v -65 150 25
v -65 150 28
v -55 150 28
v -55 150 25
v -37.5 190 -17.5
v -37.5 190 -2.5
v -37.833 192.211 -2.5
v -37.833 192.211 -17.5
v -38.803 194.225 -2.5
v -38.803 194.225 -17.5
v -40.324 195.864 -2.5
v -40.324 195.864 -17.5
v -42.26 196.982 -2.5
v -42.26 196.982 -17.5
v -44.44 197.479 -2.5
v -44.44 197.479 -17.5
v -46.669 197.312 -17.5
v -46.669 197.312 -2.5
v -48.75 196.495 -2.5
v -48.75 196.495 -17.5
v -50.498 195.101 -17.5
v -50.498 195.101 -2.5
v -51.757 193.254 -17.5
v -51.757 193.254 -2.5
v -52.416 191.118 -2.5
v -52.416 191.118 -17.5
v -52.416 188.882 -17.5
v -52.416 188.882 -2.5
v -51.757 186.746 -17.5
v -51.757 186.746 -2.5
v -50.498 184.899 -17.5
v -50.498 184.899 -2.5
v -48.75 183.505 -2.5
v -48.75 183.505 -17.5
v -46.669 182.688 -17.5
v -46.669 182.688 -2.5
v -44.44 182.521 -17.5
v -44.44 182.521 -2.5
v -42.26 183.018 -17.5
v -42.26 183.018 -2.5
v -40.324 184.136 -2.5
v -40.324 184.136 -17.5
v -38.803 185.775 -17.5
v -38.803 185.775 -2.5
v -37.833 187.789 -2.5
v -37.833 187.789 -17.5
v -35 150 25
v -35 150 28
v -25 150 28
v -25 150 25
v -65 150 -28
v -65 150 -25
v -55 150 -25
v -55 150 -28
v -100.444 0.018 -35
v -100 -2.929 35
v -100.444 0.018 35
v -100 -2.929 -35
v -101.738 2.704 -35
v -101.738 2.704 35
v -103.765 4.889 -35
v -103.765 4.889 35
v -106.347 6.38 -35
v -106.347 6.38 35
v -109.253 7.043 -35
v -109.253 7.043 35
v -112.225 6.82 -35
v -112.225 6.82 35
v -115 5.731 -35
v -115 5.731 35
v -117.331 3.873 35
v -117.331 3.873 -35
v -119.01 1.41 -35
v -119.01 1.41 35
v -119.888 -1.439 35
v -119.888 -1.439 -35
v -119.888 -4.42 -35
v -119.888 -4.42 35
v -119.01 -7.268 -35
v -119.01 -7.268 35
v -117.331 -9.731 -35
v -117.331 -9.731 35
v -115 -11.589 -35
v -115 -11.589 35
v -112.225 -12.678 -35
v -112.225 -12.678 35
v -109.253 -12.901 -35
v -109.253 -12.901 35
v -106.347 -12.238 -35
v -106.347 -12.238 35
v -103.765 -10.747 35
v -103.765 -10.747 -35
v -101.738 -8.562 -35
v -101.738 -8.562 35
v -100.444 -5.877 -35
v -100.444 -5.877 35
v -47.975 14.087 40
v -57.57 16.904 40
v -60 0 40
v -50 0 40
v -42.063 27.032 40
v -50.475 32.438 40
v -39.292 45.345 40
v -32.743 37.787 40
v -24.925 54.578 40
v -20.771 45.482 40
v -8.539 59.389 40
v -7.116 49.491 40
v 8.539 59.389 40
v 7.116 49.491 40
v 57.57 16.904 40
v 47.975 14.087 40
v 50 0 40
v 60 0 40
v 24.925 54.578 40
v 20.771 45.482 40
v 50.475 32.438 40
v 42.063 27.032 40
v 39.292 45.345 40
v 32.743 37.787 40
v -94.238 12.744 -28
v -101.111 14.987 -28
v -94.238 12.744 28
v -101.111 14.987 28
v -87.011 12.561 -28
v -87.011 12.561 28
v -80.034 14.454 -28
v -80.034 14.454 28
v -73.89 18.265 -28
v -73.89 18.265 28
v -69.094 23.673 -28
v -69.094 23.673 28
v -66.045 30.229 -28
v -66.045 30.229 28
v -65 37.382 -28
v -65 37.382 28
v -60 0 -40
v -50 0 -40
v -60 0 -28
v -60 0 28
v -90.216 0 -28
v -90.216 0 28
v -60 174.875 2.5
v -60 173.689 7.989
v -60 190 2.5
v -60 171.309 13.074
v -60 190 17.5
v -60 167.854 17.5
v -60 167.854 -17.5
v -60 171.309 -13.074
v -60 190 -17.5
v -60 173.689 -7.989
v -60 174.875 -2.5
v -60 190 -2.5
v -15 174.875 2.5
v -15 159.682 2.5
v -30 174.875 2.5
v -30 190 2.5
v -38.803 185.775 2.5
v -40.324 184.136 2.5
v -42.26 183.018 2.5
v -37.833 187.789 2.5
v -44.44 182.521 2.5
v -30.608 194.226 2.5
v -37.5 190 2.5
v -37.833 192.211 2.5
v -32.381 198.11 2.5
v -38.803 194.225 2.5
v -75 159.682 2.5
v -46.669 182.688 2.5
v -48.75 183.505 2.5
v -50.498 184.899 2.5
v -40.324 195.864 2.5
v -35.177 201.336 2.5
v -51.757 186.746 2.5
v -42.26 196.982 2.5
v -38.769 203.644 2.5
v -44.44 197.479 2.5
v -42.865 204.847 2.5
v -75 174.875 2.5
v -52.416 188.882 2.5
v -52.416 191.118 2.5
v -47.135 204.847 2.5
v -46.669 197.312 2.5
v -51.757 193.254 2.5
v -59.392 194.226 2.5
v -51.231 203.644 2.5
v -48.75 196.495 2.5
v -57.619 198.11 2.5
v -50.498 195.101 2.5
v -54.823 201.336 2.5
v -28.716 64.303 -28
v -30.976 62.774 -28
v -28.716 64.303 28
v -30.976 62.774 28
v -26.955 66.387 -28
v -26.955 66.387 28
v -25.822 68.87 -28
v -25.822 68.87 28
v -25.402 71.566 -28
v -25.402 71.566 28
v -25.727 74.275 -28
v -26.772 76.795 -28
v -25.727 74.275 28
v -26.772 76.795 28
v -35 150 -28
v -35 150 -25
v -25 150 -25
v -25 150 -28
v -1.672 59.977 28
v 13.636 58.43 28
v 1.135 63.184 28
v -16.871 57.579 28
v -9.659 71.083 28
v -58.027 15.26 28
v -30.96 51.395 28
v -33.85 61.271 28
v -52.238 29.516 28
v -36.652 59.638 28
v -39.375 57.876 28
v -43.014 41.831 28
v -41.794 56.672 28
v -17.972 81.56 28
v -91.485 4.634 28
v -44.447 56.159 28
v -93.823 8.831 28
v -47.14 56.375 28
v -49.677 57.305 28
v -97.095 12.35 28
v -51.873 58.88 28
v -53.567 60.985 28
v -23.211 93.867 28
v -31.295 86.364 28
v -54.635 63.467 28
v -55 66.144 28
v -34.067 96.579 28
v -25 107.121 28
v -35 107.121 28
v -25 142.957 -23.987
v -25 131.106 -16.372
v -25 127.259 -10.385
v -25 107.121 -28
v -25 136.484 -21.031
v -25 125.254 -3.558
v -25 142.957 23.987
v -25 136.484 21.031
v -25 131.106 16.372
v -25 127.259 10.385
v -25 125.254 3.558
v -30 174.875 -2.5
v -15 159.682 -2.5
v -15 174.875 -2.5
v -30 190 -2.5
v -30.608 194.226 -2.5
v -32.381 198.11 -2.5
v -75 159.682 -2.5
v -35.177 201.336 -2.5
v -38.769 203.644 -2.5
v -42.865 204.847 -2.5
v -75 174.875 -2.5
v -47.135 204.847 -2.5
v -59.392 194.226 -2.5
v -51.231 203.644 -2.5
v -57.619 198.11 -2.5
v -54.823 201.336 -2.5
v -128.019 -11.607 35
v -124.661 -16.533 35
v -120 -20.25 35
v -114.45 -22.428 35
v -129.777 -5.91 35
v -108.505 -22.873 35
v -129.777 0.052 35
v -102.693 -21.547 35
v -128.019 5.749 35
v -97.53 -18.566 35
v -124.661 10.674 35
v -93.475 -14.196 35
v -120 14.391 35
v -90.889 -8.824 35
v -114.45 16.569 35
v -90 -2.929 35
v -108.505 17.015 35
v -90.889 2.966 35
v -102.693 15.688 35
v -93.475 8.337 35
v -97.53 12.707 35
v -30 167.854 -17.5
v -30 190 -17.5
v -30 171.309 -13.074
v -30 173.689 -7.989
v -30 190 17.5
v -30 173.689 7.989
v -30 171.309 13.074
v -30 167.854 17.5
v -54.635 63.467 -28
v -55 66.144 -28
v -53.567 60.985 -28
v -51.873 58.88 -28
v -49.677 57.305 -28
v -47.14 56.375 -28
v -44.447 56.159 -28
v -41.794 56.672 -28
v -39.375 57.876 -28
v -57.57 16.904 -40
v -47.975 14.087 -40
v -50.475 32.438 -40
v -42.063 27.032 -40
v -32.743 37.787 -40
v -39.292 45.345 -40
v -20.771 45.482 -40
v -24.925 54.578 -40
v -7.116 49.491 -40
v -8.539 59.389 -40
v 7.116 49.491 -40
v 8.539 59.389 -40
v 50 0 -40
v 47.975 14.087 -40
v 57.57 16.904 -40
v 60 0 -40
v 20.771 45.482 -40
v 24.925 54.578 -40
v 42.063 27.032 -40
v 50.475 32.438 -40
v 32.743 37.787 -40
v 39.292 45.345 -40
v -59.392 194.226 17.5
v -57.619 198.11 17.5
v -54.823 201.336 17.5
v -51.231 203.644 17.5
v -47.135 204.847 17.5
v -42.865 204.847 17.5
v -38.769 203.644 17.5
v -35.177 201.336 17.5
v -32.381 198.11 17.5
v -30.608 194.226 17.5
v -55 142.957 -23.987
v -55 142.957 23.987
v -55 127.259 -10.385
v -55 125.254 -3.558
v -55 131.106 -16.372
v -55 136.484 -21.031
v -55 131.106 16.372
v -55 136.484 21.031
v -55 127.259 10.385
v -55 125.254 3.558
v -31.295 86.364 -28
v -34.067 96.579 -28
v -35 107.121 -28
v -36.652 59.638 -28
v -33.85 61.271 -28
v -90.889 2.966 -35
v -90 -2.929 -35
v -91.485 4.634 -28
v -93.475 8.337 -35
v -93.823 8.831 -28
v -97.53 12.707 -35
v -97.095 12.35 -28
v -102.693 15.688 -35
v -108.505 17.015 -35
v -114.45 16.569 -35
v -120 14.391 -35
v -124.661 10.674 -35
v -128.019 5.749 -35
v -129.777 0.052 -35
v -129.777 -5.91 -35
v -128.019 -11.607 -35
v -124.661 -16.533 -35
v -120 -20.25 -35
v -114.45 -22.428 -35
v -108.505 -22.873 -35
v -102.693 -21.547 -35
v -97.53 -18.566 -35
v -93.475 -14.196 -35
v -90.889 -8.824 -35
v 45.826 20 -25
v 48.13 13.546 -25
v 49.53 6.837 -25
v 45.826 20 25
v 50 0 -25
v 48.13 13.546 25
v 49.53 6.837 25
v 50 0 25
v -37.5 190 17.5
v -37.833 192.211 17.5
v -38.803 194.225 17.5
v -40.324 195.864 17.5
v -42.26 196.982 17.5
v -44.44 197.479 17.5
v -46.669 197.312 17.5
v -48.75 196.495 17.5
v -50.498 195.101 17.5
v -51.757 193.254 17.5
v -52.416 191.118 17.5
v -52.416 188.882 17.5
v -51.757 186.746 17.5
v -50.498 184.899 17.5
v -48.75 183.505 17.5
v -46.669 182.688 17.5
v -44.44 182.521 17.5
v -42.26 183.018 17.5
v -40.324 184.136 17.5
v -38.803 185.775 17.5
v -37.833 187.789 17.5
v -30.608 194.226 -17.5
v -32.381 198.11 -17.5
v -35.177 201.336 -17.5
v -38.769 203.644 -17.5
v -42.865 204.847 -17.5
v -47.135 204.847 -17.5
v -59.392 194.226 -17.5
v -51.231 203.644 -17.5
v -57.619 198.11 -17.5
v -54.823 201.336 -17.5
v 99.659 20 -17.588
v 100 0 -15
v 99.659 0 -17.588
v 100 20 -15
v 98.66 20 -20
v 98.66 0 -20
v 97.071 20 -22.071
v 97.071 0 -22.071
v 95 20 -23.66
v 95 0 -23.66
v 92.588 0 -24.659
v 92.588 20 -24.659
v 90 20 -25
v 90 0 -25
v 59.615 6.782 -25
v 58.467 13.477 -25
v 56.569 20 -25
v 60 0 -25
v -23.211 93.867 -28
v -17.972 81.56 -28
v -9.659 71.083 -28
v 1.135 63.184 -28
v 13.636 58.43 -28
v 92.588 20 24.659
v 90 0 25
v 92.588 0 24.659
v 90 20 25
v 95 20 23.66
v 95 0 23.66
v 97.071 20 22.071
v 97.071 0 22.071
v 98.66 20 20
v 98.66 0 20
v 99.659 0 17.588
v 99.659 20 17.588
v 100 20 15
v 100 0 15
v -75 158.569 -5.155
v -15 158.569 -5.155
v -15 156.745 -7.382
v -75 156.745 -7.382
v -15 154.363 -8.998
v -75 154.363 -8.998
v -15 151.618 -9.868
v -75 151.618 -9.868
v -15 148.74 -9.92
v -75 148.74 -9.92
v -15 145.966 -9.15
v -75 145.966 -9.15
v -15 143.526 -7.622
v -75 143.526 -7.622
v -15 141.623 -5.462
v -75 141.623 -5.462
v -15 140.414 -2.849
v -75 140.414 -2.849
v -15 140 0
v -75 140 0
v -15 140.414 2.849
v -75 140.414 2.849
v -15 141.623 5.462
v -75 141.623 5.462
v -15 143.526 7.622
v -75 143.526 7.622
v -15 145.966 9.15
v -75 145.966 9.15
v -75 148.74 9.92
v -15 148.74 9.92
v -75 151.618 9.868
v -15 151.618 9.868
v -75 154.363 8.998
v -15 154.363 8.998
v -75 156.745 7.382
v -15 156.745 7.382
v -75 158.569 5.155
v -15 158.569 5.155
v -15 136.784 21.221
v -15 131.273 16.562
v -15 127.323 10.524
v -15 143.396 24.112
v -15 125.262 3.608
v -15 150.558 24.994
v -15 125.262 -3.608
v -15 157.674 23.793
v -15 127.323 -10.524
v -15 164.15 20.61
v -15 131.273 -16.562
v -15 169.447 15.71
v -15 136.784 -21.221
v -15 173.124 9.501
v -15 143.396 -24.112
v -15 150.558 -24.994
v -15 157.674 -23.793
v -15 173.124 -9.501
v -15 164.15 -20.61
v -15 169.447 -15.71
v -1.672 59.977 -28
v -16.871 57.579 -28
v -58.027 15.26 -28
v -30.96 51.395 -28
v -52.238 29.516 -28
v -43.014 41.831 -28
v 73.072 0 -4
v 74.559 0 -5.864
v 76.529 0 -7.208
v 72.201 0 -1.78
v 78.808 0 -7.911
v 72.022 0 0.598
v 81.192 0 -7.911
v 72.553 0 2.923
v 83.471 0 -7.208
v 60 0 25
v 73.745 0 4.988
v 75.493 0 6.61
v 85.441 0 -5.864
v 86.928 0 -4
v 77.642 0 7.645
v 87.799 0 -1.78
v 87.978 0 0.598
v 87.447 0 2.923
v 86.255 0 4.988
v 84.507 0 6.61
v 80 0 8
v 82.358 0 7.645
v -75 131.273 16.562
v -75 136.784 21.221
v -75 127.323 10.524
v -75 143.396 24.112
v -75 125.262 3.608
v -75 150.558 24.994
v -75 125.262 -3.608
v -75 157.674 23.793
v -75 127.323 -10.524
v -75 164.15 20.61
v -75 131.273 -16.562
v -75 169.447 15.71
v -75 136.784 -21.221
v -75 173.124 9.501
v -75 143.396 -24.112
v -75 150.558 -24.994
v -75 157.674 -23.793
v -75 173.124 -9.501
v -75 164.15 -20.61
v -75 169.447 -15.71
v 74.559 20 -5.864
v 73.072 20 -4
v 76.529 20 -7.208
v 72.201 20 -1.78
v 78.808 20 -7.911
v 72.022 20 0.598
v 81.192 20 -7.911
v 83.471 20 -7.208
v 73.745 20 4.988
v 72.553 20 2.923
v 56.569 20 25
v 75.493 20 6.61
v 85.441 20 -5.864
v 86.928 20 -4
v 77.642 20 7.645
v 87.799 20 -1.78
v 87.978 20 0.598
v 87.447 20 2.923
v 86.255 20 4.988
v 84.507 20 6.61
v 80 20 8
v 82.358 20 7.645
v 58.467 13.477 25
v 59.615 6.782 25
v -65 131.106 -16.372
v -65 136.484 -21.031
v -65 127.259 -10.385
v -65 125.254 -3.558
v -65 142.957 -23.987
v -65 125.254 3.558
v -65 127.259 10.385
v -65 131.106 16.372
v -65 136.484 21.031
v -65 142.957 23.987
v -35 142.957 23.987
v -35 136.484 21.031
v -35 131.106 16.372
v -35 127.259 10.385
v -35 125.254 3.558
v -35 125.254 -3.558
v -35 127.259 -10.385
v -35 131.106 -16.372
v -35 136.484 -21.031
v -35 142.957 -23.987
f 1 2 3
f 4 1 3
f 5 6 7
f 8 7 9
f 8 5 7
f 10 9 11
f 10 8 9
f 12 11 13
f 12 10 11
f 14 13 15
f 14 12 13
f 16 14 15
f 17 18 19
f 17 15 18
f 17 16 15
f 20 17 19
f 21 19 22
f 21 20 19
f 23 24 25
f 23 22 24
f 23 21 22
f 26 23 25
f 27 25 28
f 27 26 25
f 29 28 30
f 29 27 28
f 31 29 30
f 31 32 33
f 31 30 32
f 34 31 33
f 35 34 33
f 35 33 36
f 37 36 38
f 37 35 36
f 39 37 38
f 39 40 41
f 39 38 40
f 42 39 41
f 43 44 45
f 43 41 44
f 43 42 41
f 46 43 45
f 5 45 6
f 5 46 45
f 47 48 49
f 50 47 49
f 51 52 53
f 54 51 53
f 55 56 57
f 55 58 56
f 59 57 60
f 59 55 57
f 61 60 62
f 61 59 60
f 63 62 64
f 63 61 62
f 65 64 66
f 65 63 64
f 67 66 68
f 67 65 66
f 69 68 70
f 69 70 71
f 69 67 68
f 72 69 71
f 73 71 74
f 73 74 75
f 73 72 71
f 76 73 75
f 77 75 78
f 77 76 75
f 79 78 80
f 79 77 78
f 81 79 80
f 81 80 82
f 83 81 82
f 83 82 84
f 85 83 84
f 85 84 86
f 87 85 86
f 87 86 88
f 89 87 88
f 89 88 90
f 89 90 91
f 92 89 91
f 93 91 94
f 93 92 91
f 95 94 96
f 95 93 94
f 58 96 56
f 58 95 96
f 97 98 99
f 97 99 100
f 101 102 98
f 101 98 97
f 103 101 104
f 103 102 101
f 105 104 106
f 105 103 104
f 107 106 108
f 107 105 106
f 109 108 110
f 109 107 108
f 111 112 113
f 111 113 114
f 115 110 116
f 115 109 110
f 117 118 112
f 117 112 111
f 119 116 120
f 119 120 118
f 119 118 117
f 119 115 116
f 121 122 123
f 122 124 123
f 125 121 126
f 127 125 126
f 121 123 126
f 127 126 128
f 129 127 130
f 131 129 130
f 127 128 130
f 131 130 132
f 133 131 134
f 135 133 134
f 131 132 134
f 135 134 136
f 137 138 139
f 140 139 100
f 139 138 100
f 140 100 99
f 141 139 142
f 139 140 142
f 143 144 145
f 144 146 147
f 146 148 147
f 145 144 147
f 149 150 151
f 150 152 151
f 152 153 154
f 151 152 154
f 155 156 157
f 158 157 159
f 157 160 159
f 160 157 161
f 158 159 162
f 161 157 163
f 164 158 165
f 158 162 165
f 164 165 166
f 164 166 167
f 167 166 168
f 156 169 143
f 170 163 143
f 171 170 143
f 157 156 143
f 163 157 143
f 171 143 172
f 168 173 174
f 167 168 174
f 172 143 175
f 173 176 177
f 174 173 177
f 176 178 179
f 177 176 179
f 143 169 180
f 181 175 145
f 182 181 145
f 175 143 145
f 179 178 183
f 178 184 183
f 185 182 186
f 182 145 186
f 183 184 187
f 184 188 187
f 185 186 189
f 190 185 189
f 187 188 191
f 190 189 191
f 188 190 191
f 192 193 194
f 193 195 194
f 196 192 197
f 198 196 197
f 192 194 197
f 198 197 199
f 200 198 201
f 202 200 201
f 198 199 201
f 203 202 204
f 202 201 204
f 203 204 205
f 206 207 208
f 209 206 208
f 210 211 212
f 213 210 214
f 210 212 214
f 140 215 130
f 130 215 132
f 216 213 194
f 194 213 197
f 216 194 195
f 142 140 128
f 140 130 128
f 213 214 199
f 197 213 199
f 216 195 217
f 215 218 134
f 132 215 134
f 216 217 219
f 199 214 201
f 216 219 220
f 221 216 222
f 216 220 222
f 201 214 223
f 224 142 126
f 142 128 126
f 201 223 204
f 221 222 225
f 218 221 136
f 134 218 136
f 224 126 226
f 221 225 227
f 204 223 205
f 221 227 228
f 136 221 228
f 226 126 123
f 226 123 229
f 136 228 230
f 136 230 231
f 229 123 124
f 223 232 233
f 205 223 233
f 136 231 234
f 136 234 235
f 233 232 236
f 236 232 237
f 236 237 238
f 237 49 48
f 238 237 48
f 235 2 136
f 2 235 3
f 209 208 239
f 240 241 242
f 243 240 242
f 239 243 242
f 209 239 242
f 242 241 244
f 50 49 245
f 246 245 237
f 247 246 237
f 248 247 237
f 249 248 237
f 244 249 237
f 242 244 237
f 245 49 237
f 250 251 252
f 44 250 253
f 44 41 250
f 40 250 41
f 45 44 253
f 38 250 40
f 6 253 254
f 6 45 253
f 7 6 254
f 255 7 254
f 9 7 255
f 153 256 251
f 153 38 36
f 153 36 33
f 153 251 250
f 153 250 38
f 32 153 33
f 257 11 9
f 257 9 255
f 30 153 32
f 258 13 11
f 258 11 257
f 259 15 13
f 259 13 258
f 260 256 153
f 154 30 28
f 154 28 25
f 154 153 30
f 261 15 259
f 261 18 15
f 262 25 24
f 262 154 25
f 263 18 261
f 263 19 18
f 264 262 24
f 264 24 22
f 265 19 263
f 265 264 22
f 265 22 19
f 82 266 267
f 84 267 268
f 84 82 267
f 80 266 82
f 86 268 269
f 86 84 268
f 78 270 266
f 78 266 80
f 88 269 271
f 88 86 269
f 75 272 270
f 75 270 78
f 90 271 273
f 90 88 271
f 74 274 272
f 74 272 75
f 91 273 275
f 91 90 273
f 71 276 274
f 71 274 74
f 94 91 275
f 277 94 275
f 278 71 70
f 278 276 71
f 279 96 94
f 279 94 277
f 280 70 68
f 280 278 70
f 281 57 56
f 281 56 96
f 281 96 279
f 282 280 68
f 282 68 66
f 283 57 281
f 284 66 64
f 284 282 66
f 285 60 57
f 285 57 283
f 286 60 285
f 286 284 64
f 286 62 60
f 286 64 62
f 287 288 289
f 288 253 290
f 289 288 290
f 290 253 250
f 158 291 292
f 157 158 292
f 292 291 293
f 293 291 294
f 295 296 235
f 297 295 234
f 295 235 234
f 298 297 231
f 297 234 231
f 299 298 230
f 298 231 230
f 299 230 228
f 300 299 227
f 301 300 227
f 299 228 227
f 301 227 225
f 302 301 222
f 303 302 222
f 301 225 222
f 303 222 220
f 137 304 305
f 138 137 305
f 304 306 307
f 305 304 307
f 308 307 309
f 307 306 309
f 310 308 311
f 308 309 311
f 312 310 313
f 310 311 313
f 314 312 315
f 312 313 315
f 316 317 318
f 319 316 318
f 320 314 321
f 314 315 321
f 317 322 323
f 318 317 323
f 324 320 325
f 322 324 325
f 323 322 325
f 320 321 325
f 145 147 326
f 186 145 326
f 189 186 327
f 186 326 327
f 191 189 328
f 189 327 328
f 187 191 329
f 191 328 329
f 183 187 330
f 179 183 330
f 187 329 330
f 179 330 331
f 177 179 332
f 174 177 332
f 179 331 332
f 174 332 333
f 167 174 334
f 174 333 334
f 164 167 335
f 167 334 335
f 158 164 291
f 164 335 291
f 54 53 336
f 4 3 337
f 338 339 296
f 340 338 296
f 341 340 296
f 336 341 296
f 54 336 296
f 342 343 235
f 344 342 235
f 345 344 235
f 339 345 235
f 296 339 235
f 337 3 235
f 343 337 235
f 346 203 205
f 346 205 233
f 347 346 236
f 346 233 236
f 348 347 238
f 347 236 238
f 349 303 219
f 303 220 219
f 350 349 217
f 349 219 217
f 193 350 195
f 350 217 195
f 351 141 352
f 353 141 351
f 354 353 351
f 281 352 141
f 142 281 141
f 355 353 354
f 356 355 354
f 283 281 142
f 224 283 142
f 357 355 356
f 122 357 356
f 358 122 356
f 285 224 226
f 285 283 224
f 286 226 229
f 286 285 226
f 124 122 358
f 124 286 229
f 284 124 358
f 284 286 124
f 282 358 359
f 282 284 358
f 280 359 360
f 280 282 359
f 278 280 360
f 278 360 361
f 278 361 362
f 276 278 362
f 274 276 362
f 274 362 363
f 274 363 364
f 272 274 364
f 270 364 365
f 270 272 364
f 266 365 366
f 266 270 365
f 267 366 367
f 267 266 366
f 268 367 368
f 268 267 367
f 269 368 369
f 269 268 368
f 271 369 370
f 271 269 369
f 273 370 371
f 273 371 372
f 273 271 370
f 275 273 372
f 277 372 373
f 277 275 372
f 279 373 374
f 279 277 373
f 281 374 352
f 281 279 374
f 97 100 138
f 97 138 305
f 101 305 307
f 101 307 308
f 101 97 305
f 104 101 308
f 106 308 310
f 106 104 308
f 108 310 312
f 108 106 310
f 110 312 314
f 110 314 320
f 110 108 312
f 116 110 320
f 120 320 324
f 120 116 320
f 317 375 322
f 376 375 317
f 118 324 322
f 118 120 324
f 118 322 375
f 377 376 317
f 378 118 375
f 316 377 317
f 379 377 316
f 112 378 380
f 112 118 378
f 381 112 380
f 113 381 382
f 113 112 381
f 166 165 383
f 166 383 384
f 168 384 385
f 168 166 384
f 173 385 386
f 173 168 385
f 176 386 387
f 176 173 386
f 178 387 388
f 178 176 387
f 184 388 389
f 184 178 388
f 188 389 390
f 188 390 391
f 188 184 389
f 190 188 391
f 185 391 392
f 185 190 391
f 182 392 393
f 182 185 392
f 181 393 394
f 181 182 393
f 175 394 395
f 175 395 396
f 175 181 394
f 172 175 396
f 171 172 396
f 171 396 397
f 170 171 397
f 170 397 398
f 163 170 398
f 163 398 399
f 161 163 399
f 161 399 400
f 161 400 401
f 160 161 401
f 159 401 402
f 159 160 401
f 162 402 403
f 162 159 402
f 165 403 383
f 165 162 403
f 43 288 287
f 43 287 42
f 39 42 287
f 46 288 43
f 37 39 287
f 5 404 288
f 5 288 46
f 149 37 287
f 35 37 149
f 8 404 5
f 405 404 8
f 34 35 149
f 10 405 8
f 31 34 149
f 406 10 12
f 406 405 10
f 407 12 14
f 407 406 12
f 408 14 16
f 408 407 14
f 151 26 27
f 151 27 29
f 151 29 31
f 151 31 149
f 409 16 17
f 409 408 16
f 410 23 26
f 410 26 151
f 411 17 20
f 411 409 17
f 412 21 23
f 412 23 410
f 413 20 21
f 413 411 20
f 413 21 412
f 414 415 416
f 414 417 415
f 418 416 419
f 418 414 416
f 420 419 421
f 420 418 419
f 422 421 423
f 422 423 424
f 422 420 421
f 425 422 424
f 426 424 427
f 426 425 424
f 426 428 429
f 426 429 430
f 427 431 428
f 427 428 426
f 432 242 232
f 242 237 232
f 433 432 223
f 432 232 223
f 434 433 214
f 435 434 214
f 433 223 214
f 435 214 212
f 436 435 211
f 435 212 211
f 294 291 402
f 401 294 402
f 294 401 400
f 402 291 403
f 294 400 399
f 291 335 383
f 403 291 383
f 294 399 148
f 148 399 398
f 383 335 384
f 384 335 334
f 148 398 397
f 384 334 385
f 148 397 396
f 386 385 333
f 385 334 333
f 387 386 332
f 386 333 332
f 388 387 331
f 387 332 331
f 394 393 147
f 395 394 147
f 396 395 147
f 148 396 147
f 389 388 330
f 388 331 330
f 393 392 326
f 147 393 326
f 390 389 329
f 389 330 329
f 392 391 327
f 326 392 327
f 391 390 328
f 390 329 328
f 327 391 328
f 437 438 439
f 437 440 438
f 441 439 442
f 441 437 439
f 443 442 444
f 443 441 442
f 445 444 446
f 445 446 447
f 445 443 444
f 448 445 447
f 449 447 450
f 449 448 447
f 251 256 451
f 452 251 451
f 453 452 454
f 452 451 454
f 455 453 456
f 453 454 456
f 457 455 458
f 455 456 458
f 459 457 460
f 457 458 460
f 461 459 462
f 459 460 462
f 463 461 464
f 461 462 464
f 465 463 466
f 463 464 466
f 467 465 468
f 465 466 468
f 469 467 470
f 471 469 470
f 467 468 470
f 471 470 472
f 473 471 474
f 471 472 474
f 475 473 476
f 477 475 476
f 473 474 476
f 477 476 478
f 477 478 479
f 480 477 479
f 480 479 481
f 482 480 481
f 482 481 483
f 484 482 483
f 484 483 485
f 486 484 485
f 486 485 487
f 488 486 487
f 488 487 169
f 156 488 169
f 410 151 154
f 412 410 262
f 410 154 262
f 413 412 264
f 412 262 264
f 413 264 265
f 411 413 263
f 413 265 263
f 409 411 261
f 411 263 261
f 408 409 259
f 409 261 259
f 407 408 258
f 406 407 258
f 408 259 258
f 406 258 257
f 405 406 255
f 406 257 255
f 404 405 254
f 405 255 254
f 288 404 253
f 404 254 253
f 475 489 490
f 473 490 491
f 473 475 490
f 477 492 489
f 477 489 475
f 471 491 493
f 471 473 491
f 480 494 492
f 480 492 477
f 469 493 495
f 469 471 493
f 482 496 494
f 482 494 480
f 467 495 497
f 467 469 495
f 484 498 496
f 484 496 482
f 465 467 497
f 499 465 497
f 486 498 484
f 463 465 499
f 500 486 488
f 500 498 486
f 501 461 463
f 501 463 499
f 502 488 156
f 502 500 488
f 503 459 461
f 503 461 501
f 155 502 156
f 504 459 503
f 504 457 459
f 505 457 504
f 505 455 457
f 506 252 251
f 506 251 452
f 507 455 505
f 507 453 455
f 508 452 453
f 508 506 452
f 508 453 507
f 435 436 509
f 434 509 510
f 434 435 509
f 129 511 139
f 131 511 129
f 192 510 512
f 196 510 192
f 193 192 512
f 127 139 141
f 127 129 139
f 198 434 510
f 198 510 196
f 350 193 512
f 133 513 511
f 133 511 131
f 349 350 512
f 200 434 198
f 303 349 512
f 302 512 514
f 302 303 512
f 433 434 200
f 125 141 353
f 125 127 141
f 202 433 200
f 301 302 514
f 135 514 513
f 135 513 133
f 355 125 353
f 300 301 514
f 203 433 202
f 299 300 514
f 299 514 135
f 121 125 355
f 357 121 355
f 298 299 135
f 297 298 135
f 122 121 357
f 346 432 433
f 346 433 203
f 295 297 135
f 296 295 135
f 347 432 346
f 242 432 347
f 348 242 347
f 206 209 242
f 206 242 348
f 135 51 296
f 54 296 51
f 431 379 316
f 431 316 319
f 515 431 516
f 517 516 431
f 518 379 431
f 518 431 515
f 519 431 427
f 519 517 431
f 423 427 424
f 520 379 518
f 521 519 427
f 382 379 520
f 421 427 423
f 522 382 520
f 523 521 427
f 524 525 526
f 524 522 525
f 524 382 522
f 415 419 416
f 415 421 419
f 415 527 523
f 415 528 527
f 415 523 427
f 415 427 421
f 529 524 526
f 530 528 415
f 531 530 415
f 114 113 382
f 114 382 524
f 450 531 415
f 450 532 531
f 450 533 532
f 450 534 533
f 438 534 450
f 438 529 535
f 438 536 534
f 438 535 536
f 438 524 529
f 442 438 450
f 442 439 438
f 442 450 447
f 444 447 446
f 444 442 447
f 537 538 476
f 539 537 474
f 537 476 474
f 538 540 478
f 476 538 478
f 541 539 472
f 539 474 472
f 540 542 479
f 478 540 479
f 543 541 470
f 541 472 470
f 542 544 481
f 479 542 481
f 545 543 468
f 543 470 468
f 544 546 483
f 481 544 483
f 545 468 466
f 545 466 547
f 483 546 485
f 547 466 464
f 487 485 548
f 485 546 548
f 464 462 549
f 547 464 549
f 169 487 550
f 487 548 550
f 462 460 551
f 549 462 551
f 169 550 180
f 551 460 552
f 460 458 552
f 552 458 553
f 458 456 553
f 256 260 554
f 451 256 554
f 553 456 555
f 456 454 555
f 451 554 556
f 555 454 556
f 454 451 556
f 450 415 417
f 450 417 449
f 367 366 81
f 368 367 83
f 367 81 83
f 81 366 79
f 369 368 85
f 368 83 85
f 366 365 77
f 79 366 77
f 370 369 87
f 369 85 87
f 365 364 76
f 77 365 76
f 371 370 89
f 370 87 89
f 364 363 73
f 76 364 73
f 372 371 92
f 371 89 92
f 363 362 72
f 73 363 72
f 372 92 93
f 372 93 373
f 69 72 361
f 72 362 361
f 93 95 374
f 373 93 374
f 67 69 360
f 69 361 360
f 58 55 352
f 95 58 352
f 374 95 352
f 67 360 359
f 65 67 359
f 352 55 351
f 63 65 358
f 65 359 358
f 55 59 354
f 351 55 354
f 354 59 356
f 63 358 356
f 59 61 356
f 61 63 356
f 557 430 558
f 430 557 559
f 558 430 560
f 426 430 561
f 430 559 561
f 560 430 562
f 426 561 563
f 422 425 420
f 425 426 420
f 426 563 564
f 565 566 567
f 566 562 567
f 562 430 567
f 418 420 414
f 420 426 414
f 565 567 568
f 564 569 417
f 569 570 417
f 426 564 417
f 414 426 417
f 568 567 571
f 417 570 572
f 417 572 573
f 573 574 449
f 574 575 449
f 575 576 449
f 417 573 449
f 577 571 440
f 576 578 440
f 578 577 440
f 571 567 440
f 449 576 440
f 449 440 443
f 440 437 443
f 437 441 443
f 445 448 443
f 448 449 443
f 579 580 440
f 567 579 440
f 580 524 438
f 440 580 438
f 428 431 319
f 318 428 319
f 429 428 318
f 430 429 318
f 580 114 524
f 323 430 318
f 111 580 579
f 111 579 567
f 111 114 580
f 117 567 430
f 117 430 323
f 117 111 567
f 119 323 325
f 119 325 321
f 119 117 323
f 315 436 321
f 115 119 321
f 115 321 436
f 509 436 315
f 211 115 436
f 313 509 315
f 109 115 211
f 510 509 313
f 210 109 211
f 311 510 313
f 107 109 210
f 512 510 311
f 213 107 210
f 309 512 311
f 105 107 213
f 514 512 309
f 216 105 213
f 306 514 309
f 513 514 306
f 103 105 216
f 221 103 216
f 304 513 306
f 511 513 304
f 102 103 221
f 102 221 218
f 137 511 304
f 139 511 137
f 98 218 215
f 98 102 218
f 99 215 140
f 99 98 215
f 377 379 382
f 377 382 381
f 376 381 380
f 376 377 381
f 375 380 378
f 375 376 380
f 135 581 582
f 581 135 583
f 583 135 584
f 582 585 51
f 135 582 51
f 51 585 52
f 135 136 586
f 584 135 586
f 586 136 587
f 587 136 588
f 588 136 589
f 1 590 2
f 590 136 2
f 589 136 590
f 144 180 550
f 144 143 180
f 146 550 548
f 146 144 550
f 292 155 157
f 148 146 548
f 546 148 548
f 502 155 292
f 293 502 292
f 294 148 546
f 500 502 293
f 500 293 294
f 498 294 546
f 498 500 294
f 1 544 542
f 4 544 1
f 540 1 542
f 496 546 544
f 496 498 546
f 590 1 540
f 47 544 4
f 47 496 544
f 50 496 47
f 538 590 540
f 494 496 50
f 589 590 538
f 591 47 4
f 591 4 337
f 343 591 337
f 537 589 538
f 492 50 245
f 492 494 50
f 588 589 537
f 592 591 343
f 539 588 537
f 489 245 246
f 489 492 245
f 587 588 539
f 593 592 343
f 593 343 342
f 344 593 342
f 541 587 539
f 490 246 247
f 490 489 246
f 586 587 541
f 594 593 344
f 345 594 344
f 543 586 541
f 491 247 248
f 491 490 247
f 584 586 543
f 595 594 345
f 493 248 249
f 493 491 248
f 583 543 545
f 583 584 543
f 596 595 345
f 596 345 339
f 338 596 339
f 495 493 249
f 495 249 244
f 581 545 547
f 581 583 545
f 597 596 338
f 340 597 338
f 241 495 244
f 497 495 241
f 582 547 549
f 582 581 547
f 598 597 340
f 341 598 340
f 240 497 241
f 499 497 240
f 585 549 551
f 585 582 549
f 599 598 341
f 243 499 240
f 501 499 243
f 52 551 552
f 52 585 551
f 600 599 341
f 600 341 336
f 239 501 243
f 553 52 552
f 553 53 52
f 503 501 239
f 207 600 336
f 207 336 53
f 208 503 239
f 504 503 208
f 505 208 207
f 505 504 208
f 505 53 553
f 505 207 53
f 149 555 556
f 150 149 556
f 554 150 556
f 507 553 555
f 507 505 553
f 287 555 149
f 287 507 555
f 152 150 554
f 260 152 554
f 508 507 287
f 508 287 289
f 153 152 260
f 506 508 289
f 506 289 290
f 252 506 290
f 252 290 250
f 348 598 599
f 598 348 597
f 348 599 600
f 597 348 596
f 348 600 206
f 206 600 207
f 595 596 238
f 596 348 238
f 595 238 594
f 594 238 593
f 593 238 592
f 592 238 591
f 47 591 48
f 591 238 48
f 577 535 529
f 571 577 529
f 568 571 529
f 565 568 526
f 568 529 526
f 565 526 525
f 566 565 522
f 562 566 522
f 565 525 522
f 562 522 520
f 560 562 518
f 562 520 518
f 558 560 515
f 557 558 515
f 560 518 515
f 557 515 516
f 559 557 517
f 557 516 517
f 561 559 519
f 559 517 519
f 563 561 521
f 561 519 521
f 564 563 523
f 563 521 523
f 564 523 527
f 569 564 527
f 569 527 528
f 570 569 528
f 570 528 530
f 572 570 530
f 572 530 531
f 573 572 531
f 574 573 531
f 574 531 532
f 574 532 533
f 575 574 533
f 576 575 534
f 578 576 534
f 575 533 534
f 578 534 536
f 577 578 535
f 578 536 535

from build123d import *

# Parameters (mm, degrees)
EXTRUDE_THIN1_DEPTH          = 40
SKETCH2_R                    = 20
SKETCH2_R_2                  = 10
EXTRUDE_THIN2_DEPTH          = 35
SKETCH3_W                    = 100
SKETCH3_H                    = 50
BOSS_EXTRUDE1_DEPTH          = 20
DELETEFACE4_START            = -25
DELETEFACE4_DEPTH            = 50
FILLET1_R                    = 10
SKETCH5_W                    = 8
SKETCH5_H                    = 42.929151324
SKETCH6_R                    = 25
BOSS_EXTRUDE2_DEPTH          = 60
SKETCH7_R                    = 7.5
BOSS_EXTRUDE3_DEPTH          = 17.5
BOSS_EXTRUDE4_DEPTH          = 28
F_20_0_20_DIAMETER_HOLE1_D   = 20
CUT_EXTRUDE_THIN1_DEPTH      = 239.432380351
CUT_EXTRUDE_THIN1_DEPTH_BACK = 239.432380351
SKETCH11_W                   = 5
SKETCH11_H                   = 55


# Read off the part's stored shape, not the designer's step: DeleteFace4
with BuildPart() as part:
    # Sketch1 → Extrude-Thin1 (new, symmetric)
    with BuildSketch(Plane.XY):
        with BuildLine():
            ThreePointArc((60, 0), (0, 60), (-60, 0))
            Line((-60, 0), (-50, 0))
            ThreePointArc((-50, 0), (0, 50), (50, 0))
            Line((50, 0), (60, 0))
        make_face()
    extrude(amount=EXTRUDE_THIN1_DEPTH, both=True)

    # Sketch3 → Boss-Extrude1 (add)
    with BuildSketch(Plane.XZ):
        with Locations((50, 0)):
            Rectangle(SKETCH3_W, SKETCH3_H)
    extrude(amount=-BOSS_EXTRUDE1_DEPTH)

    # DeleteFace4 outline → DeleteFace4 (cut)
    with BuildSketch(Plane.XY.offset(DELETEFACE4_START)):
        with BuildLine():
            ThreePointArc((50, 0), (48.945315647, 10.215482184), (45.82575695, 20))
            Line((45.82575695, 20), (0, 20))
            Line((0, 20), (0, 0))
            Line((0, 0), (50, 0))
        make_face()
    extrude(amount=DELETEFACE4_DEPTH, mode=Mode.SUBTRACT)

    # Fillet1
    fillet1_edges = [part.edges().sort_by_distance(p)[0] for p in [
        (100, 10, -25),
        (100, 10, 25),
    ]]
    fillet(fillet1_edges, radius=FILLET1_R)

    # Sketch5 → Ø16.0 (16) Diameter Hole1 (revolve, cut)
    with BuildSketch(Plane(origin=(80, 20, 0), x_dir=(0, 0, 1), z_dir=(1, 0, 0))):
        with Locations((4, 21.464575662)):
            Rectangle(SKETCH5_W, SKETCH5_H)
    revolve(axis=Axis((80, 26.35, 0), (0, -1, 0)), mode=Mode.SUBTRACT)



with BuildPart() as body_2:
    # Sketch2 → Extrude-Thin2 (new, symmetric)
    with BuildSketch(Plane.XY):
        with Locations((-110, -2.929151324)):
            Circle(SKETCH2_R)
        with Locations((-110, -2.929151324)):
            Circle(SKETCH2_R_2, mode=Mode.SUBTRACT)
    extrude(amount=EXTRUDE_THIN2_DEPTH, both=True)


with BuildPart() as body_3:
    # Sketch6 → Boss-Extrude2 (new body)
    with BuildSketch(Plane(origin=(-15, 0, 0), x_dir=(0, 0, -1), z_dir=(1, 0, 0))):
        with Locations((0, 150)):
            Circle(SKETCH6_R)
    extrude(amount=-BOSS_EXTRUDE2_DEPTH)

    # Sketch7 → Boss-Extrude3 (add, symmetric)
    with BuildSketch(Plane.XY):
        with BuildLine():
            Line((-60, 150), (-60, 190))
            ThreePointArc((-60, 190), (-45, 205), (-30, 190))
            Line((-30, 190), (-30, 150))
            Line((-30, 150), (-60, 150))
        make_face()
        with Locations((-45, 190)):
            Circle(SKETCH7_R, mode=Mode.SUBTRACT)
    extrude(amount=BOSS_EXTRUDE3_DEPTH, both=True)


with BuildPart() as part_1:
    add(part.part)

    add(body_2.part)  # Boss-Extrude4 merges body 2

    add(body_3.part)  # Boss-Extrude4 merges body 3
    # Sketch8 → Boss-Extrude4 (add, symmetric)
    with BuildSketch(Plane.XY):
        with BuildLine():
            Line((-25, 150), (-25, 107.121426428))
            ThreePointArc((-25, 107.121426428), (-14.16747259, 76.042348403), (13.636363636, 58.429868961))
            ThreePointArc((13.636363636, 58.429868961), (-37.29489363, 47.000967108), (-60, 0))
            Line((-60, 0), (-90.215660928, 0))
            ThreePointArc((-90.215660928, 0), (-93.823137808, 8.831338871), (-101.111111111, 14.986977006))
            ThreePointArc((-101.111111111, 14.986977006), (-76.823843083, 16.136222778), (-65, 37.382137418))
            Line((-65, 37.382137418), (-65, 150))
            Line((-65, 150), (-55, 150))
            Line((-55, 150), (-55, 66.143782777))
            ThreePointArc((-55, 66.143782777), (-49.677071733, 57.304948012), (-39.375, 57.87580993))
            ThreePointArc((-39.375, 57.87580993), (-35.260419238, 60.470677482), (-30.975558625, 62.773519639))
            ThreePointArc((-30.975558625, 62.773519639), (-25.821810248, 68.869571549), (-26.771975796, 76.79548832))
            ThreePointArc((-26.771975796, 76.79548832), (-32.906470052, 91.410260777), (-35, 107.121426428))
            Line((-35, 107.121426428), (-35, 150))
            Line((-35, 150), (-25, 150))
        make_face()
    extrude(amount=BOSS_EXTRUDE4_DEPTH, both=True)

    # Ø20.0 (20) Diameter Hole1 (through all)
    with Locations(Plane(origin=(-15, 0, 0), x_dir=(0, 0, -1), z_dir=(1, 0, 0))):
        with Locations((0, 150)):
            Hole(F_20_0_20_DIAMETER_HOLE1_D / 2)

    # Sketch11 → Cut-Extrude-Thin1 (cut, two sides: drawn at the far end of the back side and taken through both)
    with BuildSketch(Plane(origin=(-15, 0, 0), x_dir=(0, 0, -1), z_dir=(1, 0, 0)).offset(-CUT_EXTRUDE_THIN1_DEPTH_BACK)):
        with Locations((0, 177.5)):
            Rectangle(SKETCH11_W, SKETCH11_H)
    extrude(amount=CUT_EXTRUDE_THIN1_DEPTH + CUT_EXTRUDE_THIN1_DEPTH_BACK, mode=Mode.SUBTRACT)


solid = part_1.part
